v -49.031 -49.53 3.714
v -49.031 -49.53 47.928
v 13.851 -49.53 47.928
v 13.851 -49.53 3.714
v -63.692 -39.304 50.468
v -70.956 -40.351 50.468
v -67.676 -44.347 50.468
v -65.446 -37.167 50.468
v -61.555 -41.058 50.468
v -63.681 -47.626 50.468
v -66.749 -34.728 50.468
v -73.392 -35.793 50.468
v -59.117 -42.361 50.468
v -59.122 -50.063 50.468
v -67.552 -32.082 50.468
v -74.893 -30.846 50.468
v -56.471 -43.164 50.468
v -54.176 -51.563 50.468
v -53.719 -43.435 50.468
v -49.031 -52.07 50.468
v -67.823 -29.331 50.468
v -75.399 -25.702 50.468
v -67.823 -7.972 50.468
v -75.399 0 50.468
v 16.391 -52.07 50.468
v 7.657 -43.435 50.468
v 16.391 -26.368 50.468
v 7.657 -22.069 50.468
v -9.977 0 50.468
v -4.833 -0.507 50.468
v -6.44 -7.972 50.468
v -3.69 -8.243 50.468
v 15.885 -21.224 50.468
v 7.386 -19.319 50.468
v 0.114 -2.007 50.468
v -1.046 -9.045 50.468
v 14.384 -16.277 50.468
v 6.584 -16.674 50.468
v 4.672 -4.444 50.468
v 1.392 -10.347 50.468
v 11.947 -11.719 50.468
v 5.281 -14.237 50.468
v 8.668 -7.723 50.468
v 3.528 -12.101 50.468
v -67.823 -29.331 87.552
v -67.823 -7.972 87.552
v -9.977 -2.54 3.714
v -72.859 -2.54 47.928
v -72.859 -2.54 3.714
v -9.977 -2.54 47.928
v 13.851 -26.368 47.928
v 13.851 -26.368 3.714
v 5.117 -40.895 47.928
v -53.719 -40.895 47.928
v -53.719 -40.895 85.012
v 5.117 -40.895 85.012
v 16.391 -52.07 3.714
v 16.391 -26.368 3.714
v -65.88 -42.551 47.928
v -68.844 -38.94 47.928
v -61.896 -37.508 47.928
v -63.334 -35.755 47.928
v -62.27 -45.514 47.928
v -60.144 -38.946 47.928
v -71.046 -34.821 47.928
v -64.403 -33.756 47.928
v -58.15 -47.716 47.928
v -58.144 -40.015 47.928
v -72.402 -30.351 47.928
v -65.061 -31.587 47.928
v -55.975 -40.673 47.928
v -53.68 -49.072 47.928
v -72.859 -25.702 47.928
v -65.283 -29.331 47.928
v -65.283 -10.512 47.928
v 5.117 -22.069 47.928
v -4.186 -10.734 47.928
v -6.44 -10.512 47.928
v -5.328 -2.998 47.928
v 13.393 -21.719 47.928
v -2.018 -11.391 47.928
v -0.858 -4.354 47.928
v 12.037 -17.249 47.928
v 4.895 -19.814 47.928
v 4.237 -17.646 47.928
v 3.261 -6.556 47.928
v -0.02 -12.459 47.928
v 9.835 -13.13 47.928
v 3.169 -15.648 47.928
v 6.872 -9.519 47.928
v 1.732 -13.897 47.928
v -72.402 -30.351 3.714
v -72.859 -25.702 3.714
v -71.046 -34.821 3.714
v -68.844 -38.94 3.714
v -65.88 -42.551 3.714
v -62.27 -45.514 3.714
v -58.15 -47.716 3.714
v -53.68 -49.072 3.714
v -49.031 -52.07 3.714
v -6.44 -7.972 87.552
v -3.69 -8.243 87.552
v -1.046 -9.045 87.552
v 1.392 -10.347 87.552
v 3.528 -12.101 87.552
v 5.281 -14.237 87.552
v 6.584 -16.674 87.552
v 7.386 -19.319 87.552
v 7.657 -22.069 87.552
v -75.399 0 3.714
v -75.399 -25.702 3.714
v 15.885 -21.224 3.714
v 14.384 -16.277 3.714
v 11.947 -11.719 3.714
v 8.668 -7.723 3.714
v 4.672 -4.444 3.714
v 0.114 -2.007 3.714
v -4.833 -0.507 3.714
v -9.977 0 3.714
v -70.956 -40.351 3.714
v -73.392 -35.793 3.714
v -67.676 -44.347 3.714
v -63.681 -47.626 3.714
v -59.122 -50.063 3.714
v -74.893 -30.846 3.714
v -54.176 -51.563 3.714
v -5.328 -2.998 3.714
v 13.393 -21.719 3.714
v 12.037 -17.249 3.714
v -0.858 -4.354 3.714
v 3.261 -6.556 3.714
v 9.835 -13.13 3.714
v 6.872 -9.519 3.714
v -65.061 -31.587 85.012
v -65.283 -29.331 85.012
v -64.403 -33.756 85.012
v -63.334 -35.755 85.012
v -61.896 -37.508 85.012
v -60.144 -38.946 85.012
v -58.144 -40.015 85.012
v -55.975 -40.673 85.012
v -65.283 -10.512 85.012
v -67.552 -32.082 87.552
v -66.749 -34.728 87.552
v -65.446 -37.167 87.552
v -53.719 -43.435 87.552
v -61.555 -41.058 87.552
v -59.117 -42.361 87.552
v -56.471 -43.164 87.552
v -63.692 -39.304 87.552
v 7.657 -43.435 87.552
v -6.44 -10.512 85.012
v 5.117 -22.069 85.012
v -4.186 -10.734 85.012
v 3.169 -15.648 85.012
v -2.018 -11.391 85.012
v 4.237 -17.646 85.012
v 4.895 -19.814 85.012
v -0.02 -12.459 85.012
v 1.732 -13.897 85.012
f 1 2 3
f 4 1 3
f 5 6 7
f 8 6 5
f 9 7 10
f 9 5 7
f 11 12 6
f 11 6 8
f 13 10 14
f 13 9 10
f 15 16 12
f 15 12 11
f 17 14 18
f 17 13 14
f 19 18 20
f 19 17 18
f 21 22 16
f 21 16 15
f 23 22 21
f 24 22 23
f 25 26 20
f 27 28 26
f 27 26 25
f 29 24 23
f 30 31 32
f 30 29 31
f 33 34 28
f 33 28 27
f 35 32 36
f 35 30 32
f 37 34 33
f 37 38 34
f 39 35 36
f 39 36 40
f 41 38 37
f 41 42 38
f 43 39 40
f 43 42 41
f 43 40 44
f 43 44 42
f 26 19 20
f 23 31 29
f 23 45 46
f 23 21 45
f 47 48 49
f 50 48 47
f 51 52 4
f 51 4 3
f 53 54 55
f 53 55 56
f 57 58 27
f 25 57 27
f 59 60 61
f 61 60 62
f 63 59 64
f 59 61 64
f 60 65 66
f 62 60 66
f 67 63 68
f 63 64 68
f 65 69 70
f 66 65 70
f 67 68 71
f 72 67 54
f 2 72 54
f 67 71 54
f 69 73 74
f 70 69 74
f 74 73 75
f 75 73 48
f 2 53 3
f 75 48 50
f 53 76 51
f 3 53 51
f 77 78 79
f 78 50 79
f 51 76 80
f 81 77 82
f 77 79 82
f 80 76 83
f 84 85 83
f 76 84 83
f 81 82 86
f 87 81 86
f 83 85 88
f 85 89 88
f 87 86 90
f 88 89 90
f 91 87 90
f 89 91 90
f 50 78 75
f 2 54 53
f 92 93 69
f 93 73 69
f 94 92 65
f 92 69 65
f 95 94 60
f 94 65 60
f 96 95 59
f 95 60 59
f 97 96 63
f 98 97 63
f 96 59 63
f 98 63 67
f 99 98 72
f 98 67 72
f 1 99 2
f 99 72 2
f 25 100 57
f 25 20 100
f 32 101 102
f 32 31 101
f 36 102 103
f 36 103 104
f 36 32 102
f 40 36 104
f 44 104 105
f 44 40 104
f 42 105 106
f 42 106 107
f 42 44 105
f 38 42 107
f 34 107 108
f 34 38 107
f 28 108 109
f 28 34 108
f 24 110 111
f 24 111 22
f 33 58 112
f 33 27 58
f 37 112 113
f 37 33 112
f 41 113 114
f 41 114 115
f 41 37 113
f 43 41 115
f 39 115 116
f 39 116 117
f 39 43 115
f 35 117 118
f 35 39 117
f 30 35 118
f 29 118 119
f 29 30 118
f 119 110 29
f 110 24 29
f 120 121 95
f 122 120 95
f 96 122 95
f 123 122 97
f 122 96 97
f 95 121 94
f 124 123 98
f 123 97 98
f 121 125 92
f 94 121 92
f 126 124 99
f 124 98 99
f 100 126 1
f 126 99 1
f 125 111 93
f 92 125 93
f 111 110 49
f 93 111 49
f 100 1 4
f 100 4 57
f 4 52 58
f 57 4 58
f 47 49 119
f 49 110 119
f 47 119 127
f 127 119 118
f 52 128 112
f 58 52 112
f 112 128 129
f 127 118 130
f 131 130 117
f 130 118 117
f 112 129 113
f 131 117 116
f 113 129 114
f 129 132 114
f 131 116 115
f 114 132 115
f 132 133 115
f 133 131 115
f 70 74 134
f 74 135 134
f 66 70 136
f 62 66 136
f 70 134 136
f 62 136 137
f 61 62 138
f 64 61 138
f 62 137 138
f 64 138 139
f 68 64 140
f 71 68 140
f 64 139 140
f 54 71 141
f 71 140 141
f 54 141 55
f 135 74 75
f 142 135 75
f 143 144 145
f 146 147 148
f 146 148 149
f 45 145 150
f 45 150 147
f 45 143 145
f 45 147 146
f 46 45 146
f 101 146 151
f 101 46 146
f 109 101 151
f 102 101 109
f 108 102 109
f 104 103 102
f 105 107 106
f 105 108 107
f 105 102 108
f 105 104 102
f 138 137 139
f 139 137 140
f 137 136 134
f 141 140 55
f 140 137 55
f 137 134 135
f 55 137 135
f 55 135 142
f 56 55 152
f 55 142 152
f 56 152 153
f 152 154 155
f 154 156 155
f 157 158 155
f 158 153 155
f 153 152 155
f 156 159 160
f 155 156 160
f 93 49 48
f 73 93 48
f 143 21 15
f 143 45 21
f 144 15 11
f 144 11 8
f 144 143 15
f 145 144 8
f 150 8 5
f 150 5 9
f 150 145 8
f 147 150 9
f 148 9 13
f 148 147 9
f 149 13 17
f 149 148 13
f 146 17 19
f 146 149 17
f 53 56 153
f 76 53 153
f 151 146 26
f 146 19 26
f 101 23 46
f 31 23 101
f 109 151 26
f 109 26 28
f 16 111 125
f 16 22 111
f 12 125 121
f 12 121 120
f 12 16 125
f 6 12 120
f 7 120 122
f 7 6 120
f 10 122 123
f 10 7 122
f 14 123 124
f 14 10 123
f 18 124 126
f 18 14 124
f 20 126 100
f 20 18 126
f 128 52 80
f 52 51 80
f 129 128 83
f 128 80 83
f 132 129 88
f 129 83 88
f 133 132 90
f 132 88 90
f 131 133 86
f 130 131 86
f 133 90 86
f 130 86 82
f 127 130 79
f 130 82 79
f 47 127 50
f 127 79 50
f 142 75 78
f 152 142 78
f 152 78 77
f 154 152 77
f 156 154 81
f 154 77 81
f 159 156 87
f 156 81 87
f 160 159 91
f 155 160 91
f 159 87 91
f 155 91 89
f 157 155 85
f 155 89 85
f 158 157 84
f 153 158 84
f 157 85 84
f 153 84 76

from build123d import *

# Parameters (mm, degrees)
F0_W     = 91.7905736715
F0_H     = 46.7539317906
F1_DEPTH = 52.07
F2_R     = 26.3680405282
F3_W     = 75.4797728732
F3_H     = 35.4631096125
F4_DEPTH = 25.4
F5_DEPTH = 11.684
F6_R     = 14.1038356314
F7_R     = 14.097
F8_T     = -2.54


with BuildPart() as f1:
    # F0 (on Front) → F1 (new body)
    with BuildSketch(Plane.XZ):
        with Locations((-29.504111968, 27.0913075656)):
            Rectangle(F0_W, F0_H)
    extrude(amount=F1_DEPTH)

    # F2
    f2_edges = [f1.edges().sort_by_distance(p)[0] for p in [
        (-75.399399, -52.07, 27.091308),
        (16.391175, 0, 27.091308),
    ]]
    fillet(f2_edges, radius=F2_R)

    # F3 (on face) → F4 (join)
    with BuildSketch(Plane.XY.offset(50.4682734609)):
        with Locations((-30.0831585191, -25.7032476366)):
            Rectangle(F3_W, F3_H)
    extrude(amount=F4_DEPTH)

    # F5 (add): a face of the model
    f5_faces = [f1.faces().sort_by_distance(p)[0] for p in [
        (-30.0831585191, -25.7032476366, 75.8682734609),
    ]]
    extrude(f5_faces, amount=F5_DEPTH)

    # F6
    f6_edges = [f1.edges().sort_by_distance(p)[0] for p in [
        (-67.823045, -43.434802, 69.010273),
    ]]
    fillet(f6_edges, radius=F6_R)

    # F7
    f7_edges = [f1.edges().sort_by_distance(p)[0] for p in [
        (7.656728, -7.971693, 69.010273),
    ]]
    fillet(f7_edges, radius=F7_R)

    # F8
    f8_openings = [f1.faces().sort_by_distance(p)[0] for p in [
        (-29.504112, -26.035, 3.714342),
    ]]
    offset(amount=F8_T, openings=f8_openings, kind=Kind.INTERSECTION)


solid = f1.part
